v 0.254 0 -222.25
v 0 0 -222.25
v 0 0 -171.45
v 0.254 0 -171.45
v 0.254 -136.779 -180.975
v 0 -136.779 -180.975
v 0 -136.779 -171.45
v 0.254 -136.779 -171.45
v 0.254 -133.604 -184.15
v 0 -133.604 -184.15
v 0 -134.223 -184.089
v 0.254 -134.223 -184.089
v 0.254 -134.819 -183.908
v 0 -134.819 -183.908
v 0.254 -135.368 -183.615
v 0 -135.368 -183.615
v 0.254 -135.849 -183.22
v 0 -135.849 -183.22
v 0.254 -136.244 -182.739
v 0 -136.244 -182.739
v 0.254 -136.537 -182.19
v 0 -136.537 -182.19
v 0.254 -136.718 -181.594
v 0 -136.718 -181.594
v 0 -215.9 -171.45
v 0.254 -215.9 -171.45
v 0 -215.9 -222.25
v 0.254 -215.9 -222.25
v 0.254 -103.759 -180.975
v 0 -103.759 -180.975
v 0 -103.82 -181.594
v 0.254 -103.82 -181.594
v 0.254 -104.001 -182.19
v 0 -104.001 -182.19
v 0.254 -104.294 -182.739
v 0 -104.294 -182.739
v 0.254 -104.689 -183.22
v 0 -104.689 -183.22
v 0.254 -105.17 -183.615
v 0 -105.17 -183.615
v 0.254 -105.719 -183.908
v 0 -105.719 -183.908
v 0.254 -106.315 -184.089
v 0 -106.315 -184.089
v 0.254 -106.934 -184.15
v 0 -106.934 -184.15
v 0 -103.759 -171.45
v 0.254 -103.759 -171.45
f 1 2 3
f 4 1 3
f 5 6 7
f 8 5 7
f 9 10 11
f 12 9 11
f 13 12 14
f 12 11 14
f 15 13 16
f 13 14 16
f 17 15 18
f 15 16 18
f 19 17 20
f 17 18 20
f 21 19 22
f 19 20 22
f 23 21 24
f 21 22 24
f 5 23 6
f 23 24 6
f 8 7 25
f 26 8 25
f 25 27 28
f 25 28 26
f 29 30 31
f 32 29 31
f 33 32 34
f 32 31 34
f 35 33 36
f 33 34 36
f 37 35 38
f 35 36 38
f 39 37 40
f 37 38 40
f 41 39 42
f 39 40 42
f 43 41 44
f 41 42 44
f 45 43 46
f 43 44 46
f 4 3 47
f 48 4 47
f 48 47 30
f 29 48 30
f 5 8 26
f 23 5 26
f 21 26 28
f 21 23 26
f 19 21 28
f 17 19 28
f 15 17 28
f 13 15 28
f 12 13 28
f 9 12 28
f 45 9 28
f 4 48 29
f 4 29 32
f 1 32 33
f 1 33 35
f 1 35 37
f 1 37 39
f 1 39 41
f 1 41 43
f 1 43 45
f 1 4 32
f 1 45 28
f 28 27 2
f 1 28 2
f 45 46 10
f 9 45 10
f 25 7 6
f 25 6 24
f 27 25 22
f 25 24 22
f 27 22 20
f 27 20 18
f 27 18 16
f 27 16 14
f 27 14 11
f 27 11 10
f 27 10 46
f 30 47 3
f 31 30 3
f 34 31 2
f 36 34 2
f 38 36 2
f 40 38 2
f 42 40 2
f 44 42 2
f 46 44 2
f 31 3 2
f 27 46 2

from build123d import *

# Parameters (mm, degrees)
BOSS_EXTRUDE2_DEPTH = 0.254
CUT_EXTRUDE1_DEPTH  = 1.254
SKETCH13_W          = 222.25
SKETCH13_H          = 69.85
CUT_EXTRUDE3_DEPTH  = 1.254


with BuildPart() as part:
    # Sketch1 → Boss-Extrude2 (new body)
    with BuildSketch(Plane(origin=(0, 0, 0), x_dir=(0, 0, -1), z_dir=(1, 0, 0))):
        with BuildLine():
            Line((0, -234.95), (0, -285.75))
            Line((0, -285.75), (203.2, -285.75))
            ThreePointArc((203.2, -285.75), (216.670384182, -280.170384182), (222.25, -266.7))
            Line((222.25, -266.7), (222.25, 0))
            Line((222.25, 0), (171.45, 0))
            Line((171.45, 0), (171.45, -215.9))
            ThreePointArc((171.45, -215.9), (165.870384182, -229.370384182), (152.4, -234.95))
            Line((152.4, -234.95), (0, -234.95))
        make_face()
    extrude(amount=BOSS_EXTRUDE2_DEPTH)

    # Sketch11 → Cut-Extrude1 (cut, through all)
    with BuildSketch(Plane.ZY):
        with BuildLine():
            Line((-171.45, -103.759), (-180.975, -103.759))
            ThreePointArc((-180.975, -103.759), (-183.22006403, -104.68893597), (-184.15, -106.934))
            Line((-184.15, -106.934), (-184.15, -133.604))
            ThreePointArc((-184.15, -133.604), (-183.22006403, -135.84906403), (-180.975, -136.779))
            Line((-180.975, -136.779), (-171.45, -136.779))
            Line((-171.45, -136.779), (-171.45, -103.759))
        make_face()
        with BuildLine():
            Line((-44.45, -234.95), (-31.75, -234.95))
            Line((-31.75, -234.95), (-31.75, -244.475))
            ThreePointArc((-31.75, -244.475), (-32.67993597, -246.72006403), (-34.925, -247.65))
            Line((-34.925, -247.65), (-41.275, -247.65))
            ThreePointArc((-41.275, -247.65), (-43.52006403, -246.72006403), (-44.45, -244.475))
            Line((-44.45, -244.475), (-44.45, -234.95))
        make_face()
    extrude(amount=-CUT_EXTRUDE1_DEPTH, mode=Mode.SUBTRACT)

    # Sketch13 → Cut-Extrude3 (cut, through all)
    with BuildSketch(Plane.ZY):
        with Locations((-111.125, -250.825)):
            Rectangle(SKETCH13_W, SKETCH13_H)
    extrude(amount=-CUT_EXTRUDE3_DEPTH, mode=Mode.SUBTRACT)


solid = part.part
